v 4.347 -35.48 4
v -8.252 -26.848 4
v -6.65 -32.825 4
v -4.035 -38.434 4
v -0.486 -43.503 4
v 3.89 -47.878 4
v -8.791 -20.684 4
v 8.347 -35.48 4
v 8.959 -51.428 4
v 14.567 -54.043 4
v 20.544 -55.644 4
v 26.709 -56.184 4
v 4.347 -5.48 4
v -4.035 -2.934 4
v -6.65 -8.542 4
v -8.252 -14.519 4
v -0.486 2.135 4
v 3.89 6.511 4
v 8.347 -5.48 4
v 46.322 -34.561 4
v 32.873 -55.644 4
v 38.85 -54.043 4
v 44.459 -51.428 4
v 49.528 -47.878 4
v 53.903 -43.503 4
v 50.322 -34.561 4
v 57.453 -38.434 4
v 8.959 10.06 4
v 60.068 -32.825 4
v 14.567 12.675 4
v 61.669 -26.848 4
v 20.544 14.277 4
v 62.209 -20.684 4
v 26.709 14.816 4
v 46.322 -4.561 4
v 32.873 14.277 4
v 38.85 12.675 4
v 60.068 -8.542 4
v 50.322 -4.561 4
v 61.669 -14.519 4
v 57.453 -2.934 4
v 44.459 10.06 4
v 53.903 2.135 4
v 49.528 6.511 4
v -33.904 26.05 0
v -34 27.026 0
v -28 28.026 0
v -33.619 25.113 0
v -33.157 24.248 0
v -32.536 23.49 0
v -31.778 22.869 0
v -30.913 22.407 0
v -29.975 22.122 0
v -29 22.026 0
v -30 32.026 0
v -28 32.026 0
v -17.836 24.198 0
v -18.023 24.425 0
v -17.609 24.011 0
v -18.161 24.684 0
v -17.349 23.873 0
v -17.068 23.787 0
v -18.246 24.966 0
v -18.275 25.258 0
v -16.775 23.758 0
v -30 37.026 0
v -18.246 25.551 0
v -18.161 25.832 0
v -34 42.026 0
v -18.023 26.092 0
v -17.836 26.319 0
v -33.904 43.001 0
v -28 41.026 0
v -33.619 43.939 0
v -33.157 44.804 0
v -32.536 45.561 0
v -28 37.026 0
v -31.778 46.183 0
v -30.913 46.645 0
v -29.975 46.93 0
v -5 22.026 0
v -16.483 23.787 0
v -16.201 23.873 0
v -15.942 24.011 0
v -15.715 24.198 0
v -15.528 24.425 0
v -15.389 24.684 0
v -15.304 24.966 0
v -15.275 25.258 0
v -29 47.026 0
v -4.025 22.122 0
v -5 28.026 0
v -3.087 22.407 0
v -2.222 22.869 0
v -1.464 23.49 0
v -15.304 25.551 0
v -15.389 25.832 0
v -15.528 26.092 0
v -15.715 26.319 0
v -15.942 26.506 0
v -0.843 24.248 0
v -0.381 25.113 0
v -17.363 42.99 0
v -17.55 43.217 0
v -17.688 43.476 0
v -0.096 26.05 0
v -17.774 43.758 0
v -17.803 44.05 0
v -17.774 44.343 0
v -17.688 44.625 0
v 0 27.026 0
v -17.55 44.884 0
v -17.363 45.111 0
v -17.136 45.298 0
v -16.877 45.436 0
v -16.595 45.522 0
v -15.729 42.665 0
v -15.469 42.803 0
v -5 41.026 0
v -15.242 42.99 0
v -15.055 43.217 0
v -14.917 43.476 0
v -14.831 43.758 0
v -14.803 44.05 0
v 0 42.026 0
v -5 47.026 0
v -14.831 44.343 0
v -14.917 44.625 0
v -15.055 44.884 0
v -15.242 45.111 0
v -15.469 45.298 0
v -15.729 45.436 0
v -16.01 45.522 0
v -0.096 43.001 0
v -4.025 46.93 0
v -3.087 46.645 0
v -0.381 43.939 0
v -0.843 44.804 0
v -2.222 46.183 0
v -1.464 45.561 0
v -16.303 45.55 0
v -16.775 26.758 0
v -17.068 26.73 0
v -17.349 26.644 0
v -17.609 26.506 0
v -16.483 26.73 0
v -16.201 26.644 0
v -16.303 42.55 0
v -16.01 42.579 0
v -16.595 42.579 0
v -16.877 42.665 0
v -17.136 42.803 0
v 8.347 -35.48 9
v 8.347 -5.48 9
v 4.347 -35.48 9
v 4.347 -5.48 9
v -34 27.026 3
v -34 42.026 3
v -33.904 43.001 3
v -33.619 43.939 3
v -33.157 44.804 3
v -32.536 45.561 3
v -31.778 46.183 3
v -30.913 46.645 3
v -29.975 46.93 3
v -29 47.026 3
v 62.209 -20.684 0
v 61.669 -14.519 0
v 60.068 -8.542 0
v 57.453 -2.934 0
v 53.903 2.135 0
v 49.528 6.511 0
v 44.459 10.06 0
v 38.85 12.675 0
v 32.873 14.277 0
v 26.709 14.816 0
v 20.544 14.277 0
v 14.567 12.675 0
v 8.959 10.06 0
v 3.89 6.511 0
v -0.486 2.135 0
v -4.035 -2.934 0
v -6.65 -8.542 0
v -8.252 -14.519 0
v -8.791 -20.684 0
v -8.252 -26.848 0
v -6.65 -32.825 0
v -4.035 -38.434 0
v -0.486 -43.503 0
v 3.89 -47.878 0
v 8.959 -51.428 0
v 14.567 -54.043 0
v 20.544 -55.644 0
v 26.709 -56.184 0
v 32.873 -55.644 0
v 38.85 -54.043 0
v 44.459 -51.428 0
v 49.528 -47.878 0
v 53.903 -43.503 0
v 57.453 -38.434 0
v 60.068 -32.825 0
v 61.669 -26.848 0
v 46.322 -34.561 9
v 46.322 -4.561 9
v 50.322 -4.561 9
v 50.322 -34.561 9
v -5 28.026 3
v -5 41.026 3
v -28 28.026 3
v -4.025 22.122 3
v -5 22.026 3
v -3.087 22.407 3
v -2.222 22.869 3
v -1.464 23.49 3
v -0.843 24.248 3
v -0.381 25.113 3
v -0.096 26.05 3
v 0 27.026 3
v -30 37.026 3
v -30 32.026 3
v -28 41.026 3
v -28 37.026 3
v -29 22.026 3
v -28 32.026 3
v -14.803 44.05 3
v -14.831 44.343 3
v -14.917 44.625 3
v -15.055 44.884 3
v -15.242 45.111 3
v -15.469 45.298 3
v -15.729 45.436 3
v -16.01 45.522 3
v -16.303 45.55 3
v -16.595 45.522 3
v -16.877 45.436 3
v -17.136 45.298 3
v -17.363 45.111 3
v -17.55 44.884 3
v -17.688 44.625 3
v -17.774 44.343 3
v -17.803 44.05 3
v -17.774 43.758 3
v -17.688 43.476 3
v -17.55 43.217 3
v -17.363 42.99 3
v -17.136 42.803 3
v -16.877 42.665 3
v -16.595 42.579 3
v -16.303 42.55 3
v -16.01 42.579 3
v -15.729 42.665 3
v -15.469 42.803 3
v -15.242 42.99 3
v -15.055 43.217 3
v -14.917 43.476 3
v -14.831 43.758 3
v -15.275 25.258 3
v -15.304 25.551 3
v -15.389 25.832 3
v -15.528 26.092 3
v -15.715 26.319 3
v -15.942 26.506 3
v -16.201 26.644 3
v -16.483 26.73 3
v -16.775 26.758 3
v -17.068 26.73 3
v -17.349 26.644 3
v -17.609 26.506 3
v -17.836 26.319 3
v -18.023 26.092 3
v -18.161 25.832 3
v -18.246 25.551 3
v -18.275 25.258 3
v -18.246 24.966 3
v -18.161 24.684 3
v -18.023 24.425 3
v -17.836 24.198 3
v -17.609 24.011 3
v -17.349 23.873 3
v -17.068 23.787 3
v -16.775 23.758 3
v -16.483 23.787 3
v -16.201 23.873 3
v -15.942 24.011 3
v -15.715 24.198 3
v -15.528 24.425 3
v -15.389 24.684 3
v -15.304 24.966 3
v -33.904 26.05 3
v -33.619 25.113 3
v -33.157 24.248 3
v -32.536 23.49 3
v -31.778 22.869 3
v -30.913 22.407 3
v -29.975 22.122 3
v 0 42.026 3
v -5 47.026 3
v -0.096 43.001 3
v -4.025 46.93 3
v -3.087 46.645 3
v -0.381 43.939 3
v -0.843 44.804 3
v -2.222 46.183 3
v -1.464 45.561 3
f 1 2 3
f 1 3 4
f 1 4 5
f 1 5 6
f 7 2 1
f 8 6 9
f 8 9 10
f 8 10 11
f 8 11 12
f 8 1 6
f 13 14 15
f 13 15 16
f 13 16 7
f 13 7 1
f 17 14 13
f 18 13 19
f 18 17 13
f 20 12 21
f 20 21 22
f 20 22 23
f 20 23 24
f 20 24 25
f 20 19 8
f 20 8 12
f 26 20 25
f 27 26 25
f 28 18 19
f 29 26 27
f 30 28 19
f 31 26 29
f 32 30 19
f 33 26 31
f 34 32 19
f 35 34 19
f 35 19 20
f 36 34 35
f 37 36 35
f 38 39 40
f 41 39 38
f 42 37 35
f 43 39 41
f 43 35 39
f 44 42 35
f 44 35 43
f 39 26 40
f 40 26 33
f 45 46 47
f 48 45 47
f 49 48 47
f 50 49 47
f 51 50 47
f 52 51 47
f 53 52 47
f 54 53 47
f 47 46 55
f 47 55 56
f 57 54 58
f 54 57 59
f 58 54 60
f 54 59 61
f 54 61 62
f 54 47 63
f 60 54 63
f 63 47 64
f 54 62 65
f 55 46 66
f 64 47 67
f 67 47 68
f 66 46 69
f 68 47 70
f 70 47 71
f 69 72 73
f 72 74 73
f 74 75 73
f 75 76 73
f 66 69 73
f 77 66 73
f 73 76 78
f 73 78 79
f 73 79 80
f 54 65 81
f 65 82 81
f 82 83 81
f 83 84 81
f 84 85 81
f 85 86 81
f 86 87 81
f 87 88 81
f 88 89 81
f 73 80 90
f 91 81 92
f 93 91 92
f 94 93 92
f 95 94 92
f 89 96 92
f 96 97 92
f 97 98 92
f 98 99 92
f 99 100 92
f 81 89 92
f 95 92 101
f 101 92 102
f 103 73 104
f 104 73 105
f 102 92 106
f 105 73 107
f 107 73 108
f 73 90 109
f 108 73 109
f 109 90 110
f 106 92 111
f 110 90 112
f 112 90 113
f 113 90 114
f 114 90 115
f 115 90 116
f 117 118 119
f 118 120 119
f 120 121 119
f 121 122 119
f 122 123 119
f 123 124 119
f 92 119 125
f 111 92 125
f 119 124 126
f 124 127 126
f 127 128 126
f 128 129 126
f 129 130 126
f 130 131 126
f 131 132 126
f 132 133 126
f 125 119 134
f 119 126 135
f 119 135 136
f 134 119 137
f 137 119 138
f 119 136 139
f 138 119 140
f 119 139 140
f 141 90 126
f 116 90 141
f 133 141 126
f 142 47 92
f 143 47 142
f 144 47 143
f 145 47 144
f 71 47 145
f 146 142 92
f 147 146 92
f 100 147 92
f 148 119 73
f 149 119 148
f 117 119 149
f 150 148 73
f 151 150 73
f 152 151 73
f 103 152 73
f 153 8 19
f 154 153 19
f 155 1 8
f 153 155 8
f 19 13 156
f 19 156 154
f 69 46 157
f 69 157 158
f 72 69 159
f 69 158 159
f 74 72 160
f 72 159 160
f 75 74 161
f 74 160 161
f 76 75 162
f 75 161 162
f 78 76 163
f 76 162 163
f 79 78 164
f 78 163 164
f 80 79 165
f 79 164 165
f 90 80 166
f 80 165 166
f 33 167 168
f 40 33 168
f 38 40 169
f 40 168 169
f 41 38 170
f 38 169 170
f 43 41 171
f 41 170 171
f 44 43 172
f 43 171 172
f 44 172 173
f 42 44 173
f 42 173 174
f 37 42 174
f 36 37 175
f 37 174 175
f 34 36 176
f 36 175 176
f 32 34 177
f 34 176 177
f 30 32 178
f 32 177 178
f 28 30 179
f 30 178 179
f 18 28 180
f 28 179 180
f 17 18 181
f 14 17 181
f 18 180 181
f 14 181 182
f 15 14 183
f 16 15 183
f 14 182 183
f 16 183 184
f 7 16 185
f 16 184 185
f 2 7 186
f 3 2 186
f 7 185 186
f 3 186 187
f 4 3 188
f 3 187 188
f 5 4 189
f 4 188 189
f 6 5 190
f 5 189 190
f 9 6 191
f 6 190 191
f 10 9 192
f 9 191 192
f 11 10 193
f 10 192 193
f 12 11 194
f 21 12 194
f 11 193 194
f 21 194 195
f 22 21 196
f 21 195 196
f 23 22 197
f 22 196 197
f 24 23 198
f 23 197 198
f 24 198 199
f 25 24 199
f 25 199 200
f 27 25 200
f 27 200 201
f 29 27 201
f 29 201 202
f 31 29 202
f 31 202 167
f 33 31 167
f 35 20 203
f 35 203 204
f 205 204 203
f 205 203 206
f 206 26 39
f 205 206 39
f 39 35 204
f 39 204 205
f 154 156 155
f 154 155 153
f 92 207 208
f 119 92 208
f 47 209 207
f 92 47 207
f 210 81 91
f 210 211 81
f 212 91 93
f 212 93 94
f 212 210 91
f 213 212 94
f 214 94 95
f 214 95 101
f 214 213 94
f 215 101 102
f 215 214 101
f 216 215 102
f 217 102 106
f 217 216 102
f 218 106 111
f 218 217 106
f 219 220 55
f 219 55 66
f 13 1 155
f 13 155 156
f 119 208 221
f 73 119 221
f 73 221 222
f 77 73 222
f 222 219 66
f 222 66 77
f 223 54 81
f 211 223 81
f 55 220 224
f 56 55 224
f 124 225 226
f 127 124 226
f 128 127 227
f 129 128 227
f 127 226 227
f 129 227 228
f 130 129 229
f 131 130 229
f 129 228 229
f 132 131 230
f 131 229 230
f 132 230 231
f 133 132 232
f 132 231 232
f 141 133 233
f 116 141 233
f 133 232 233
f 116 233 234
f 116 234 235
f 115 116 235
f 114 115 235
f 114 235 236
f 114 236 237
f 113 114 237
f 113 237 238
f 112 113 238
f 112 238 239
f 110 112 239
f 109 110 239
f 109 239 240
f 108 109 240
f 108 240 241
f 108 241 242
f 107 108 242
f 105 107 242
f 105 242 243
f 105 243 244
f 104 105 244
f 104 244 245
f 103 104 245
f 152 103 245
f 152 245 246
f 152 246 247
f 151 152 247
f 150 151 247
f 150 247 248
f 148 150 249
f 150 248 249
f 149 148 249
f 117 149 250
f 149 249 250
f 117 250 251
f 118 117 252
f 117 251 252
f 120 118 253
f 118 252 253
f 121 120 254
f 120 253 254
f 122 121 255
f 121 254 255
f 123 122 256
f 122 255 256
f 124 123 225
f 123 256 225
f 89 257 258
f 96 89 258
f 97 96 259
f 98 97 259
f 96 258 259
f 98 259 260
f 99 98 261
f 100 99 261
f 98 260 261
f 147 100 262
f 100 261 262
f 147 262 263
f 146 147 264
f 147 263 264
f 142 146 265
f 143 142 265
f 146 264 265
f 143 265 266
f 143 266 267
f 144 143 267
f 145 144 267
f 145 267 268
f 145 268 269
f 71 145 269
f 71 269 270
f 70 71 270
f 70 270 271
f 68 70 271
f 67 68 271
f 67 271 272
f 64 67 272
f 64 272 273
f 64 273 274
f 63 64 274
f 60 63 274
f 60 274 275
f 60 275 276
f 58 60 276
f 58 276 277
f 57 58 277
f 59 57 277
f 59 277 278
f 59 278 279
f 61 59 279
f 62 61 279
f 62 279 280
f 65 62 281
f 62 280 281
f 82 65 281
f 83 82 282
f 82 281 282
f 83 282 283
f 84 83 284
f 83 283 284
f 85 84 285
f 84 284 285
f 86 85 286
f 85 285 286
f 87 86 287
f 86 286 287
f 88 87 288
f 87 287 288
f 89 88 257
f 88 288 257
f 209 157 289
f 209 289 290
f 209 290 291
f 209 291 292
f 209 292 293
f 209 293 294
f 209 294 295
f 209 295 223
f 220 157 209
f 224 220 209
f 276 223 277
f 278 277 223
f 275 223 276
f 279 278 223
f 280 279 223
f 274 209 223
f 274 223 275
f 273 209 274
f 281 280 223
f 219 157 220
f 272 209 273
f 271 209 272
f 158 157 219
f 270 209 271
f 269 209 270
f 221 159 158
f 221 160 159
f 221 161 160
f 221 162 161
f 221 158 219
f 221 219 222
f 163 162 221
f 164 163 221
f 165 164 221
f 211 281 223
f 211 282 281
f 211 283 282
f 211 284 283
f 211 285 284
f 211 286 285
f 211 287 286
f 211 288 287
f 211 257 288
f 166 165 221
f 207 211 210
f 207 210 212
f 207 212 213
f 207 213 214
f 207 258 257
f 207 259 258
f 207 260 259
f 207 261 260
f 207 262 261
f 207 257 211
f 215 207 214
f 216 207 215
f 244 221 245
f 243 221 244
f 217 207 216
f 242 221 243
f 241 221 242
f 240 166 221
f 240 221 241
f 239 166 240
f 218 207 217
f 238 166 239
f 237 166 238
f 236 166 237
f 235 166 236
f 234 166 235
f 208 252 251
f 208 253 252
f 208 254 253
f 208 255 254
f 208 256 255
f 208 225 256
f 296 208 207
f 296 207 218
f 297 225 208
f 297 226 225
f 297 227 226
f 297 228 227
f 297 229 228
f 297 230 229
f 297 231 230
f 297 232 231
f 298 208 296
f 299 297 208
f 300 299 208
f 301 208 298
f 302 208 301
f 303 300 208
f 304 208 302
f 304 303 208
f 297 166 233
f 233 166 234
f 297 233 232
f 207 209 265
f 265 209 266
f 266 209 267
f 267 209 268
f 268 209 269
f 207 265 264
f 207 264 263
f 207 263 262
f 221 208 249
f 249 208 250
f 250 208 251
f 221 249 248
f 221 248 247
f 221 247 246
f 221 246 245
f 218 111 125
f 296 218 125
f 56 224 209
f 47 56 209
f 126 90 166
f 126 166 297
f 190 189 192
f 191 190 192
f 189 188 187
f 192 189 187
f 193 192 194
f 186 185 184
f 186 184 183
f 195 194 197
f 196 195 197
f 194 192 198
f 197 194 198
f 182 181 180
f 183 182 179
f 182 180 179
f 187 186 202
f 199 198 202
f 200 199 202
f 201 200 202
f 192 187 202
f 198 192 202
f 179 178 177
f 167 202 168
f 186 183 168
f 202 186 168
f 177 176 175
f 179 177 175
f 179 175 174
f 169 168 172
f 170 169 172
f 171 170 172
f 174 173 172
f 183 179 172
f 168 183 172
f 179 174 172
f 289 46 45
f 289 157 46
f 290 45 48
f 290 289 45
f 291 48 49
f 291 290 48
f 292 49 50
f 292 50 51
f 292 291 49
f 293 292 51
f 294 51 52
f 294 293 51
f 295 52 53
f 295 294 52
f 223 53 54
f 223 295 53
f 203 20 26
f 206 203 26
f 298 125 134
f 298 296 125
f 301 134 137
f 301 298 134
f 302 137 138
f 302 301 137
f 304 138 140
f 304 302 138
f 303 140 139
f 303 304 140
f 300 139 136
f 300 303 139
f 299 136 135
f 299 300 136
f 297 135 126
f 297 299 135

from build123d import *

# Parameters (mm, degrees)
F0_W     = 34
F0_H     = 25
F1_DEPTH = 3
F2_R     = 5
F3_W     = 2
F3_H     = 5
F3_R     = 1.5
F4_DEPTH = 25
F5_R     = 35.5
F6_DEPTH = 4
F7_W     = 4
F7_H     = 30
F8_DEPTH = 5


with BuildPart() as f1:
    # F0 (on Top) → F1 (new body)
    with BuildSketch(Plane.XY):
        with Locations((-17, 34.525927)):
            Rectangle(F0_W, F0_H)
    extrude(amount=F1_DEPTH)

    # F2
    f2_edges = [f1.edges().sort_by_distance(p)[0] for p in [
        (0, 47.025927, 1.5),
        (0, 22.025927, 1.5),
        (-34, 22.025927, 1.5),
        (-34, 47.025927, 1.5),
    ]]
    fillet(f2_edges, radius=F2_R)

    # F3 (on face) → F4 (cut)
    with BuildSketch(Plane.XY.offset(3)):
        Polygon((-16.5, 28.025927), (-5, 28.025927), (-5, 41.025927), (-16.5, 41.025927), (-28, 41.025927), (-28, 37.025927), (-28, 32.025927), (-28, 28.025927), align=None)
        with Locations((-29, 34.525927)):
            Rectangle(F3_W, F3_H)
        with Locations((-16.302576, 44.050492)):
            Circle(F3_R)
        with Locations((-16.775301, 25.258444)):
            Circle(F3_R)
    extrude(amount=-F4_DEPTH, mode=Mode.SUBTRACT)


with BuildPart() as f6:
    # F5 (on Top) → F6 (new body)
    with BuildSketch(Plane.XY):
        with Locations((26.708765, -20.683685)):
            Circle(F5_R)
    extrude(amount=F6_DEPTH)

    # F7 (on face) → F8 (join)
    with BuildSketch(Plane.XY.offset(4)):
        with Locations((48.321746, -19.56074)):
            Rectangle(F7_W, F7_H)
        with Locations((6.346511, -20.480365)):
            Rectangle(F7_W, F7_H)
    extrude(amount=F8_DEPTH)


solid = Compound([f1.part, f6.part])
